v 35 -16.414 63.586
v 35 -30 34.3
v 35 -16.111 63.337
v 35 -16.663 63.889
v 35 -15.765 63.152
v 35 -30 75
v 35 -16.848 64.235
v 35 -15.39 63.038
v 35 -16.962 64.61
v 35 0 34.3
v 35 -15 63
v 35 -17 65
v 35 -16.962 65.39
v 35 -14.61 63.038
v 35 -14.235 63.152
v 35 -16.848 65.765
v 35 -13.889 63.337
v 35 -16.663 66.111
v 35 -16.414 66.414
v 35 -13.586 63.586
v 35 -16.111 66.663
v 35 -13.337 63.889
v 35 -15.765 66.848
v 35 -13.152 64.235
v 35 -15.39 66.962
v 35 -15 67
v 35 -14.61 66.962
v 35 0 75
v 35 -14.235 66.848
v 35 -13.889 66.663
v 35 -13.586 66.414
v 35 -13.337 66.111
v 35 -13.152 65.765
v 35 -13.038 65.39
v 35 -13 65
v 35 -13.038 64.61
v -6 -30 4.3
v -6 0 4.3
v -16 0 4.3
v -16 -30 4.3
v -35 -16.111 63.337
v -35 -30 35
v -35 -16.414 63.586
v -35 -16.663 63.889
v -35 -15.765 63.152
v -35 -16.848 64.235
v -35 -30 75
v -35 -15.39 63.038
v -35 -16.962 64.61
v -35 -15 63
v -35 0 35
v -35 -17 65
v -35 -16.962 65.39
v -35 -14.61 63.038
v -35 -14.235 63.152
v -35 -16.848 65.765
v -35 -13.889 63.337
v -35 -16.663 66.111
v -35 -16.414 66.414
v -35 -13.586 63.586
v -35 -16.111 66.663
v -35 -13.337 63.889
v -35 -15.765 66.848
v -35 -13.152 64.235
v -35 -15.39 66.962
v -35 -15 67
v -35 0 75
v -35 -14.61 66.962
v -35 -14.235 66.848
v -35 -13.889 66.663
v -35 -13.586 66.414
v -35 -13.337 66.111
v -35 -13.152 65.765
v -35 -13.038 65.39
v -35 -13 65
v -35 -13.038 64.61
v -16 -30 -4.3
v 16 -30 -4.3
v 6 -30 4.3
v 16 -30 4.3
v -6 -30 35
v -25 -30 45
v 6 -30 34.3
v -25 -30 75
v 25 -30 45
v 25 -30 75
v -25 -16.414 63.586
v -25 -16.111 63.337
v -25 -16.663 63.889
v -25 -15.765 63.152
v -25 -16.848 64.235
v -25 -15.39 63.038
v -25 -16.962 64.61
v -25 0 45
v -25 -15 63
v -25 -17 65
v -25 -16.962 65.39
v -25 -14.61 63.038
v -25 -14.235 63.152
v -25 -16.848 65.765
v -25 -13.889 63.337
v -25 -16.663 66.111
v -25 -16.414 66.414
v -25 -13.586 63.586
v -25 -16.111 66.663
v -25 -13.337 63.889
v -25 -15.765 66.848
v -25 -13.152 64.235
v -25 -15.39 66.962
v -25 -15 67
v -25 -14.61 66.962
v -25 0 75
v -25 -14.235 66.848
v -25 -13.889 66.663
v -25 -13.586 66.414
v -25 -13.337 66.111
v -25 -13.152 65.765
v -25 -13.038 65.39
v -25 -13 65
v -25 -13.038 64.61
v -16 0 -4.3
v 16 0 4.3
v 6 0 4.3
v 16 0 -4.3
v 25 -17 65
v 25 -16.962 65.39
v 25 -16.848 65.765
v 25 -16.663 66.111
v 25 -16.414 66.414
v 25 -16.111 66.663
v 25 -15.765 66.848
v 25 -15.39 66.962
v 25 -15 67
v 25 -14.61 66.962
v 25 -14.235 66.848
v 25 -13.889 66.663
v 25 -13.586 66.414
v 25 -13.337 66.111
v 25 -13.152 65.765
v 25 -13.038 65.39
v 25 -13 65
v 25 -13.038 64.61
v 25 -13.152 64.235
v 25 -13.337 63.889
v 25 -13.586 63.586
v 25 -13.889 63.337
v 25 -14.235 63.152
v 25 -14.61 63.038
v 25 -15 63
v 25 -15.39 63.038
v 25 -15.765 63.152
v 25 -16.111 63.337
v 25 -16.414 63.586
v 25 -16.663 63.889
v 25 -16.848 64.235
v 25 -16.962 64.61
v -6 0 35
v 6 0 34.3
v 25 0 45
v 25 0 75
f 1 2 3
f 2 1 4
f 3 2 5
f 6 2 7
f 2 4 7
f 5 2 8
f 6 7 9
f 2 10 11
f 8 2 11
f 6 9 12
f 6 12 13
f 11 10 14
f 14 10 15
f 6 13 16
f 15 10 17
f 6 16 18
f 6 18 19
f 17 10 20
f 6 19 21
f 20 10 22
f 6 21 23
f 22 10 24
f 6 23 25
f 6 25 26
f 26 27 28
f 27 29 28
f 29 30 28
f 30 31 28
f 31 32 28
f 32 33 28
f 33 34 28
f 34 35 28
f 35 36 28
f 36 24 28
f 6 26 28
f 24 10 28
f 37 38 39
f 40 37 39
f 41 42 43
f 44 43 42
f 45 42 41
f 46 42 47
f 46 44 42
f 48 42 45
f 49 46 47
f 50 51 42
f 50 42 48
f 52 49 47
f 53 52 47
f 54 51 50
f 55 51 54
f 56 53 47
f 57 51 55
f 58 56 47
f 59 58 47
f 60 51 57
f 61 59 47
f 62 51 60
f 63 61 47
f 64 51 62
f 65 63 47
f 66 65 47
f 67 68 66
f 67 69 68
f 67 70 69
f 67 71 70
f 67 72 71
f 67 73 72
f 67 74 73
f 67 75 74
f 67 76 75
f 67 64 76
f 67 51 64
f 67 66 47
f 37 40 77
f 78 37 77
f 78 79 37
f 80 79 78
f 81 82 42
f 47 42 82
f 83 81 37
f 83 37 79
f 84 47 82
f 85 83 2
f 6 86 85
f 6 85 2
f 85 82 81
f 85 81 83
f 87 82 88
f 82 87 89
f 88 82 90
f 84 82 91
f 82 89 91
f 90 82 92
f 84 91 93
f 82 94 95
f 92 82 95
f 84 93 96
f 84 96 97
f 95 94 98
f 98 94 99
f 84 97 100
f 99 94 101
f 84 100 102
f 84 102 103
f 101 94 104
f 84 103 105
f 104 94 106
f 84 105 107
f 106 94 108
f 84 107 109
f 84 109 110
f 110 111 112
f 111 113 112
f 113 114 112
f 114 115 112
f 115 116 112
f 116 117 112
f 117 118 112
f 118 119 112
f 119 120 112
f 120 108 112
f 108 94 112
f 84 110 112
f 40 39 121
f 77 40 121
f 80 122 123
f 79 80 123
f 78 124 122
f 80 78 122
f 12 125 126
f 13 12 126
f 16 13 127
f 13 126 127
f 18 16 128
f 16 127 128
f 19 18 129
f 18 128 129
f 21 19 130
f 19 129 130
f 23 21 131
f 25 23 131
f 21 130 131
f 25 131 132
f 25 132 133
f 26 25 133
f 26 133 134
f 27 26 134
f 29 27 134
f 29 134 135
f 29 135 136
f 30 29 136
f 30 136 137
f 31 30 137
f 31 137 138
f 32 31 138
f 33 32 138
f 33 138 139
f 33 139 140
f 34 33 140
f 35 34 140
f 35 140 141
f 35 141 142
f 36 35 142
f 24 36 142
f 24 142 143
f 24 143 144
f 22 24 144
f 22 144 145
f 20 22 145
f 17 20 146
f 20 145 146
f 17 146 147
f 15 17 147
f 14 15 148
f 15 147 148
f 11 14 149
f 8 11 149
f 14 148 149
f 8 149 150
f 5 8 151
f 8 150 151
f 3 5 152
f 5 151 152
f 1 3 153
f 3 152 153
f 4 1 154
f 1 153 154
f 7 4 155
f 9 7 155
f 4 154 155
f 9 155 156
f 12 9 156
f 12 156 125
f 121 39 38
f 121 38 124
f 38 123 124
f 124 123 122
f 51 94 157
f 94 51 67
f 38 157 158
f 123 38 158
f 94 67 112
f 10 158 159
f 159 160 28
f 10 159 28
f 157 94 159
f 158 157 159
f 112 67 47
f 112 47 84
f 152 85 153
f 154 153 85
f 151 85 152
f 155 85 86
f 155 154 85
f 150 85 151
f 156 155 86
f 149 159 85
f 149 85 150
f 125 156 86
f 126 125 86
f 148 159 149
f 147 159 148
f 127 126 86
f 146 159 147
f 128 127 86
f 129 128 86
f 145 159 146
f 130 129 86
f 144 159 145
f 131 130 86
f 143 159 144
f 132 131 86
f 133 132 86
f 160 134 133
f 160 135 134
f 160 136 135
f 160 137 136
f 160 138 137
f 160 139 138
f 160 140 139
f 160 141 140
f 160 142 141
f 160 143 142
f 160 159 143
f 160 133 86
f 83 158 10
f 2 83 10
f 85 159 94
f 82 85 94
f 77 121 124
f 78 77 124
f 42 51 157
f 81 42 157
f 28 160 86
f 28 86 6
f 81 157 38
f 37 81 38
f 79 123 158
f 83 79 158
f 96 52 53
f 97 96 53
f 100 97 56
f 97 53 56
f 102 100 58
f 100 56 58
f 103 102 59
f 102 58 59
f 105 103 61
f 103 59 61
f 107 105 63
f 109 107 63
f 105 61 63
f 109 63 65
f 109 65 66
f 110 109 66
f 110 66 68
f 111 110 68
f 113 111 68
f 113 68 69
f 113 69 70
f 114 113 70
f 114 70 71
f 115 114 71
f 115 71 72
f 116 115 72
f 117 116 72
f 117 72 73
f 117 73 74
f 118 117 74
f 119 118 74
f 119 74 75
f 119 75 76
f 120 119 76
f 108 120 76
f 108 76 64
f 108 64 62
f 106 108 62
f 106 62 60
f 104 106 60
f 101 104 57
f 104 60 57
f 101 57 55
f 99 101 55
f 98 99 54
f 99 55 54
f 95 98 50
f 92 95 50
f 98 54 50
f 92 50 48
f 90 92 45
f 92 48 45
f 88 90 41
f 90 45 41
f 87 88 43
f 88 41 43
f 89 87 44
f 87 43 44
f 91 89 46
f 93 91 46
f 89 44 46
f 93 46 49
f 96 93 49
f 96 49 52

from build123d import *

# Parameters (mm, degrees)
F1_DEPTH = 30
F0_W     = 10
F0_H     = 30
F2_DEPTH = 30
F3_DEPTH = 30
F4_R     = 2
F5_DEPTH = 70.001


with BuildPart() as f1:
    # F0 (on Front) → F1 (new body)
    with BuildSketch(Plane.XZ):
        Polygon((-16, -4.3), (16, -4.3), (16, 4.3), (6, 4.3), (6, 34.3), (35, 34.3), (35, 45), (25, 45), (-25, 45), (-35, 45), (-35, 35), (-6, 35), (-6, 4.3), (-16, 4.3), align=None)
    extrude(amount=F1_DEPTH)

    # F0 (on Front) → F2 (join)
    with BuildSketch(Plane.XZ):
        with Locations((30, 60)):
            Rectangle(F0_W, F0_H)
    extrude(amount=F2_DEPTH)

    # F0 (on Front) → F3 (join)
    with BuildSketch(Plane.XZ):
        with Locations((-30, 60)):
            Rectangle(F0_W, F0_H)
    extrude(amount=F3_DEPTH)

    # F4 (on face) → F5 (cut, through all)
    with BuildSketch(Plane(origin=(-35, 0, 0), x_dir=(0, -1, 0), z_dir=(-1, 0, 0))):
        with Locations((15, 65)):
            Circle(F4_R)
    extrude(amount=-F5_DEPTH, mode=Mode.SUBTRACT)


solid = f1.part
